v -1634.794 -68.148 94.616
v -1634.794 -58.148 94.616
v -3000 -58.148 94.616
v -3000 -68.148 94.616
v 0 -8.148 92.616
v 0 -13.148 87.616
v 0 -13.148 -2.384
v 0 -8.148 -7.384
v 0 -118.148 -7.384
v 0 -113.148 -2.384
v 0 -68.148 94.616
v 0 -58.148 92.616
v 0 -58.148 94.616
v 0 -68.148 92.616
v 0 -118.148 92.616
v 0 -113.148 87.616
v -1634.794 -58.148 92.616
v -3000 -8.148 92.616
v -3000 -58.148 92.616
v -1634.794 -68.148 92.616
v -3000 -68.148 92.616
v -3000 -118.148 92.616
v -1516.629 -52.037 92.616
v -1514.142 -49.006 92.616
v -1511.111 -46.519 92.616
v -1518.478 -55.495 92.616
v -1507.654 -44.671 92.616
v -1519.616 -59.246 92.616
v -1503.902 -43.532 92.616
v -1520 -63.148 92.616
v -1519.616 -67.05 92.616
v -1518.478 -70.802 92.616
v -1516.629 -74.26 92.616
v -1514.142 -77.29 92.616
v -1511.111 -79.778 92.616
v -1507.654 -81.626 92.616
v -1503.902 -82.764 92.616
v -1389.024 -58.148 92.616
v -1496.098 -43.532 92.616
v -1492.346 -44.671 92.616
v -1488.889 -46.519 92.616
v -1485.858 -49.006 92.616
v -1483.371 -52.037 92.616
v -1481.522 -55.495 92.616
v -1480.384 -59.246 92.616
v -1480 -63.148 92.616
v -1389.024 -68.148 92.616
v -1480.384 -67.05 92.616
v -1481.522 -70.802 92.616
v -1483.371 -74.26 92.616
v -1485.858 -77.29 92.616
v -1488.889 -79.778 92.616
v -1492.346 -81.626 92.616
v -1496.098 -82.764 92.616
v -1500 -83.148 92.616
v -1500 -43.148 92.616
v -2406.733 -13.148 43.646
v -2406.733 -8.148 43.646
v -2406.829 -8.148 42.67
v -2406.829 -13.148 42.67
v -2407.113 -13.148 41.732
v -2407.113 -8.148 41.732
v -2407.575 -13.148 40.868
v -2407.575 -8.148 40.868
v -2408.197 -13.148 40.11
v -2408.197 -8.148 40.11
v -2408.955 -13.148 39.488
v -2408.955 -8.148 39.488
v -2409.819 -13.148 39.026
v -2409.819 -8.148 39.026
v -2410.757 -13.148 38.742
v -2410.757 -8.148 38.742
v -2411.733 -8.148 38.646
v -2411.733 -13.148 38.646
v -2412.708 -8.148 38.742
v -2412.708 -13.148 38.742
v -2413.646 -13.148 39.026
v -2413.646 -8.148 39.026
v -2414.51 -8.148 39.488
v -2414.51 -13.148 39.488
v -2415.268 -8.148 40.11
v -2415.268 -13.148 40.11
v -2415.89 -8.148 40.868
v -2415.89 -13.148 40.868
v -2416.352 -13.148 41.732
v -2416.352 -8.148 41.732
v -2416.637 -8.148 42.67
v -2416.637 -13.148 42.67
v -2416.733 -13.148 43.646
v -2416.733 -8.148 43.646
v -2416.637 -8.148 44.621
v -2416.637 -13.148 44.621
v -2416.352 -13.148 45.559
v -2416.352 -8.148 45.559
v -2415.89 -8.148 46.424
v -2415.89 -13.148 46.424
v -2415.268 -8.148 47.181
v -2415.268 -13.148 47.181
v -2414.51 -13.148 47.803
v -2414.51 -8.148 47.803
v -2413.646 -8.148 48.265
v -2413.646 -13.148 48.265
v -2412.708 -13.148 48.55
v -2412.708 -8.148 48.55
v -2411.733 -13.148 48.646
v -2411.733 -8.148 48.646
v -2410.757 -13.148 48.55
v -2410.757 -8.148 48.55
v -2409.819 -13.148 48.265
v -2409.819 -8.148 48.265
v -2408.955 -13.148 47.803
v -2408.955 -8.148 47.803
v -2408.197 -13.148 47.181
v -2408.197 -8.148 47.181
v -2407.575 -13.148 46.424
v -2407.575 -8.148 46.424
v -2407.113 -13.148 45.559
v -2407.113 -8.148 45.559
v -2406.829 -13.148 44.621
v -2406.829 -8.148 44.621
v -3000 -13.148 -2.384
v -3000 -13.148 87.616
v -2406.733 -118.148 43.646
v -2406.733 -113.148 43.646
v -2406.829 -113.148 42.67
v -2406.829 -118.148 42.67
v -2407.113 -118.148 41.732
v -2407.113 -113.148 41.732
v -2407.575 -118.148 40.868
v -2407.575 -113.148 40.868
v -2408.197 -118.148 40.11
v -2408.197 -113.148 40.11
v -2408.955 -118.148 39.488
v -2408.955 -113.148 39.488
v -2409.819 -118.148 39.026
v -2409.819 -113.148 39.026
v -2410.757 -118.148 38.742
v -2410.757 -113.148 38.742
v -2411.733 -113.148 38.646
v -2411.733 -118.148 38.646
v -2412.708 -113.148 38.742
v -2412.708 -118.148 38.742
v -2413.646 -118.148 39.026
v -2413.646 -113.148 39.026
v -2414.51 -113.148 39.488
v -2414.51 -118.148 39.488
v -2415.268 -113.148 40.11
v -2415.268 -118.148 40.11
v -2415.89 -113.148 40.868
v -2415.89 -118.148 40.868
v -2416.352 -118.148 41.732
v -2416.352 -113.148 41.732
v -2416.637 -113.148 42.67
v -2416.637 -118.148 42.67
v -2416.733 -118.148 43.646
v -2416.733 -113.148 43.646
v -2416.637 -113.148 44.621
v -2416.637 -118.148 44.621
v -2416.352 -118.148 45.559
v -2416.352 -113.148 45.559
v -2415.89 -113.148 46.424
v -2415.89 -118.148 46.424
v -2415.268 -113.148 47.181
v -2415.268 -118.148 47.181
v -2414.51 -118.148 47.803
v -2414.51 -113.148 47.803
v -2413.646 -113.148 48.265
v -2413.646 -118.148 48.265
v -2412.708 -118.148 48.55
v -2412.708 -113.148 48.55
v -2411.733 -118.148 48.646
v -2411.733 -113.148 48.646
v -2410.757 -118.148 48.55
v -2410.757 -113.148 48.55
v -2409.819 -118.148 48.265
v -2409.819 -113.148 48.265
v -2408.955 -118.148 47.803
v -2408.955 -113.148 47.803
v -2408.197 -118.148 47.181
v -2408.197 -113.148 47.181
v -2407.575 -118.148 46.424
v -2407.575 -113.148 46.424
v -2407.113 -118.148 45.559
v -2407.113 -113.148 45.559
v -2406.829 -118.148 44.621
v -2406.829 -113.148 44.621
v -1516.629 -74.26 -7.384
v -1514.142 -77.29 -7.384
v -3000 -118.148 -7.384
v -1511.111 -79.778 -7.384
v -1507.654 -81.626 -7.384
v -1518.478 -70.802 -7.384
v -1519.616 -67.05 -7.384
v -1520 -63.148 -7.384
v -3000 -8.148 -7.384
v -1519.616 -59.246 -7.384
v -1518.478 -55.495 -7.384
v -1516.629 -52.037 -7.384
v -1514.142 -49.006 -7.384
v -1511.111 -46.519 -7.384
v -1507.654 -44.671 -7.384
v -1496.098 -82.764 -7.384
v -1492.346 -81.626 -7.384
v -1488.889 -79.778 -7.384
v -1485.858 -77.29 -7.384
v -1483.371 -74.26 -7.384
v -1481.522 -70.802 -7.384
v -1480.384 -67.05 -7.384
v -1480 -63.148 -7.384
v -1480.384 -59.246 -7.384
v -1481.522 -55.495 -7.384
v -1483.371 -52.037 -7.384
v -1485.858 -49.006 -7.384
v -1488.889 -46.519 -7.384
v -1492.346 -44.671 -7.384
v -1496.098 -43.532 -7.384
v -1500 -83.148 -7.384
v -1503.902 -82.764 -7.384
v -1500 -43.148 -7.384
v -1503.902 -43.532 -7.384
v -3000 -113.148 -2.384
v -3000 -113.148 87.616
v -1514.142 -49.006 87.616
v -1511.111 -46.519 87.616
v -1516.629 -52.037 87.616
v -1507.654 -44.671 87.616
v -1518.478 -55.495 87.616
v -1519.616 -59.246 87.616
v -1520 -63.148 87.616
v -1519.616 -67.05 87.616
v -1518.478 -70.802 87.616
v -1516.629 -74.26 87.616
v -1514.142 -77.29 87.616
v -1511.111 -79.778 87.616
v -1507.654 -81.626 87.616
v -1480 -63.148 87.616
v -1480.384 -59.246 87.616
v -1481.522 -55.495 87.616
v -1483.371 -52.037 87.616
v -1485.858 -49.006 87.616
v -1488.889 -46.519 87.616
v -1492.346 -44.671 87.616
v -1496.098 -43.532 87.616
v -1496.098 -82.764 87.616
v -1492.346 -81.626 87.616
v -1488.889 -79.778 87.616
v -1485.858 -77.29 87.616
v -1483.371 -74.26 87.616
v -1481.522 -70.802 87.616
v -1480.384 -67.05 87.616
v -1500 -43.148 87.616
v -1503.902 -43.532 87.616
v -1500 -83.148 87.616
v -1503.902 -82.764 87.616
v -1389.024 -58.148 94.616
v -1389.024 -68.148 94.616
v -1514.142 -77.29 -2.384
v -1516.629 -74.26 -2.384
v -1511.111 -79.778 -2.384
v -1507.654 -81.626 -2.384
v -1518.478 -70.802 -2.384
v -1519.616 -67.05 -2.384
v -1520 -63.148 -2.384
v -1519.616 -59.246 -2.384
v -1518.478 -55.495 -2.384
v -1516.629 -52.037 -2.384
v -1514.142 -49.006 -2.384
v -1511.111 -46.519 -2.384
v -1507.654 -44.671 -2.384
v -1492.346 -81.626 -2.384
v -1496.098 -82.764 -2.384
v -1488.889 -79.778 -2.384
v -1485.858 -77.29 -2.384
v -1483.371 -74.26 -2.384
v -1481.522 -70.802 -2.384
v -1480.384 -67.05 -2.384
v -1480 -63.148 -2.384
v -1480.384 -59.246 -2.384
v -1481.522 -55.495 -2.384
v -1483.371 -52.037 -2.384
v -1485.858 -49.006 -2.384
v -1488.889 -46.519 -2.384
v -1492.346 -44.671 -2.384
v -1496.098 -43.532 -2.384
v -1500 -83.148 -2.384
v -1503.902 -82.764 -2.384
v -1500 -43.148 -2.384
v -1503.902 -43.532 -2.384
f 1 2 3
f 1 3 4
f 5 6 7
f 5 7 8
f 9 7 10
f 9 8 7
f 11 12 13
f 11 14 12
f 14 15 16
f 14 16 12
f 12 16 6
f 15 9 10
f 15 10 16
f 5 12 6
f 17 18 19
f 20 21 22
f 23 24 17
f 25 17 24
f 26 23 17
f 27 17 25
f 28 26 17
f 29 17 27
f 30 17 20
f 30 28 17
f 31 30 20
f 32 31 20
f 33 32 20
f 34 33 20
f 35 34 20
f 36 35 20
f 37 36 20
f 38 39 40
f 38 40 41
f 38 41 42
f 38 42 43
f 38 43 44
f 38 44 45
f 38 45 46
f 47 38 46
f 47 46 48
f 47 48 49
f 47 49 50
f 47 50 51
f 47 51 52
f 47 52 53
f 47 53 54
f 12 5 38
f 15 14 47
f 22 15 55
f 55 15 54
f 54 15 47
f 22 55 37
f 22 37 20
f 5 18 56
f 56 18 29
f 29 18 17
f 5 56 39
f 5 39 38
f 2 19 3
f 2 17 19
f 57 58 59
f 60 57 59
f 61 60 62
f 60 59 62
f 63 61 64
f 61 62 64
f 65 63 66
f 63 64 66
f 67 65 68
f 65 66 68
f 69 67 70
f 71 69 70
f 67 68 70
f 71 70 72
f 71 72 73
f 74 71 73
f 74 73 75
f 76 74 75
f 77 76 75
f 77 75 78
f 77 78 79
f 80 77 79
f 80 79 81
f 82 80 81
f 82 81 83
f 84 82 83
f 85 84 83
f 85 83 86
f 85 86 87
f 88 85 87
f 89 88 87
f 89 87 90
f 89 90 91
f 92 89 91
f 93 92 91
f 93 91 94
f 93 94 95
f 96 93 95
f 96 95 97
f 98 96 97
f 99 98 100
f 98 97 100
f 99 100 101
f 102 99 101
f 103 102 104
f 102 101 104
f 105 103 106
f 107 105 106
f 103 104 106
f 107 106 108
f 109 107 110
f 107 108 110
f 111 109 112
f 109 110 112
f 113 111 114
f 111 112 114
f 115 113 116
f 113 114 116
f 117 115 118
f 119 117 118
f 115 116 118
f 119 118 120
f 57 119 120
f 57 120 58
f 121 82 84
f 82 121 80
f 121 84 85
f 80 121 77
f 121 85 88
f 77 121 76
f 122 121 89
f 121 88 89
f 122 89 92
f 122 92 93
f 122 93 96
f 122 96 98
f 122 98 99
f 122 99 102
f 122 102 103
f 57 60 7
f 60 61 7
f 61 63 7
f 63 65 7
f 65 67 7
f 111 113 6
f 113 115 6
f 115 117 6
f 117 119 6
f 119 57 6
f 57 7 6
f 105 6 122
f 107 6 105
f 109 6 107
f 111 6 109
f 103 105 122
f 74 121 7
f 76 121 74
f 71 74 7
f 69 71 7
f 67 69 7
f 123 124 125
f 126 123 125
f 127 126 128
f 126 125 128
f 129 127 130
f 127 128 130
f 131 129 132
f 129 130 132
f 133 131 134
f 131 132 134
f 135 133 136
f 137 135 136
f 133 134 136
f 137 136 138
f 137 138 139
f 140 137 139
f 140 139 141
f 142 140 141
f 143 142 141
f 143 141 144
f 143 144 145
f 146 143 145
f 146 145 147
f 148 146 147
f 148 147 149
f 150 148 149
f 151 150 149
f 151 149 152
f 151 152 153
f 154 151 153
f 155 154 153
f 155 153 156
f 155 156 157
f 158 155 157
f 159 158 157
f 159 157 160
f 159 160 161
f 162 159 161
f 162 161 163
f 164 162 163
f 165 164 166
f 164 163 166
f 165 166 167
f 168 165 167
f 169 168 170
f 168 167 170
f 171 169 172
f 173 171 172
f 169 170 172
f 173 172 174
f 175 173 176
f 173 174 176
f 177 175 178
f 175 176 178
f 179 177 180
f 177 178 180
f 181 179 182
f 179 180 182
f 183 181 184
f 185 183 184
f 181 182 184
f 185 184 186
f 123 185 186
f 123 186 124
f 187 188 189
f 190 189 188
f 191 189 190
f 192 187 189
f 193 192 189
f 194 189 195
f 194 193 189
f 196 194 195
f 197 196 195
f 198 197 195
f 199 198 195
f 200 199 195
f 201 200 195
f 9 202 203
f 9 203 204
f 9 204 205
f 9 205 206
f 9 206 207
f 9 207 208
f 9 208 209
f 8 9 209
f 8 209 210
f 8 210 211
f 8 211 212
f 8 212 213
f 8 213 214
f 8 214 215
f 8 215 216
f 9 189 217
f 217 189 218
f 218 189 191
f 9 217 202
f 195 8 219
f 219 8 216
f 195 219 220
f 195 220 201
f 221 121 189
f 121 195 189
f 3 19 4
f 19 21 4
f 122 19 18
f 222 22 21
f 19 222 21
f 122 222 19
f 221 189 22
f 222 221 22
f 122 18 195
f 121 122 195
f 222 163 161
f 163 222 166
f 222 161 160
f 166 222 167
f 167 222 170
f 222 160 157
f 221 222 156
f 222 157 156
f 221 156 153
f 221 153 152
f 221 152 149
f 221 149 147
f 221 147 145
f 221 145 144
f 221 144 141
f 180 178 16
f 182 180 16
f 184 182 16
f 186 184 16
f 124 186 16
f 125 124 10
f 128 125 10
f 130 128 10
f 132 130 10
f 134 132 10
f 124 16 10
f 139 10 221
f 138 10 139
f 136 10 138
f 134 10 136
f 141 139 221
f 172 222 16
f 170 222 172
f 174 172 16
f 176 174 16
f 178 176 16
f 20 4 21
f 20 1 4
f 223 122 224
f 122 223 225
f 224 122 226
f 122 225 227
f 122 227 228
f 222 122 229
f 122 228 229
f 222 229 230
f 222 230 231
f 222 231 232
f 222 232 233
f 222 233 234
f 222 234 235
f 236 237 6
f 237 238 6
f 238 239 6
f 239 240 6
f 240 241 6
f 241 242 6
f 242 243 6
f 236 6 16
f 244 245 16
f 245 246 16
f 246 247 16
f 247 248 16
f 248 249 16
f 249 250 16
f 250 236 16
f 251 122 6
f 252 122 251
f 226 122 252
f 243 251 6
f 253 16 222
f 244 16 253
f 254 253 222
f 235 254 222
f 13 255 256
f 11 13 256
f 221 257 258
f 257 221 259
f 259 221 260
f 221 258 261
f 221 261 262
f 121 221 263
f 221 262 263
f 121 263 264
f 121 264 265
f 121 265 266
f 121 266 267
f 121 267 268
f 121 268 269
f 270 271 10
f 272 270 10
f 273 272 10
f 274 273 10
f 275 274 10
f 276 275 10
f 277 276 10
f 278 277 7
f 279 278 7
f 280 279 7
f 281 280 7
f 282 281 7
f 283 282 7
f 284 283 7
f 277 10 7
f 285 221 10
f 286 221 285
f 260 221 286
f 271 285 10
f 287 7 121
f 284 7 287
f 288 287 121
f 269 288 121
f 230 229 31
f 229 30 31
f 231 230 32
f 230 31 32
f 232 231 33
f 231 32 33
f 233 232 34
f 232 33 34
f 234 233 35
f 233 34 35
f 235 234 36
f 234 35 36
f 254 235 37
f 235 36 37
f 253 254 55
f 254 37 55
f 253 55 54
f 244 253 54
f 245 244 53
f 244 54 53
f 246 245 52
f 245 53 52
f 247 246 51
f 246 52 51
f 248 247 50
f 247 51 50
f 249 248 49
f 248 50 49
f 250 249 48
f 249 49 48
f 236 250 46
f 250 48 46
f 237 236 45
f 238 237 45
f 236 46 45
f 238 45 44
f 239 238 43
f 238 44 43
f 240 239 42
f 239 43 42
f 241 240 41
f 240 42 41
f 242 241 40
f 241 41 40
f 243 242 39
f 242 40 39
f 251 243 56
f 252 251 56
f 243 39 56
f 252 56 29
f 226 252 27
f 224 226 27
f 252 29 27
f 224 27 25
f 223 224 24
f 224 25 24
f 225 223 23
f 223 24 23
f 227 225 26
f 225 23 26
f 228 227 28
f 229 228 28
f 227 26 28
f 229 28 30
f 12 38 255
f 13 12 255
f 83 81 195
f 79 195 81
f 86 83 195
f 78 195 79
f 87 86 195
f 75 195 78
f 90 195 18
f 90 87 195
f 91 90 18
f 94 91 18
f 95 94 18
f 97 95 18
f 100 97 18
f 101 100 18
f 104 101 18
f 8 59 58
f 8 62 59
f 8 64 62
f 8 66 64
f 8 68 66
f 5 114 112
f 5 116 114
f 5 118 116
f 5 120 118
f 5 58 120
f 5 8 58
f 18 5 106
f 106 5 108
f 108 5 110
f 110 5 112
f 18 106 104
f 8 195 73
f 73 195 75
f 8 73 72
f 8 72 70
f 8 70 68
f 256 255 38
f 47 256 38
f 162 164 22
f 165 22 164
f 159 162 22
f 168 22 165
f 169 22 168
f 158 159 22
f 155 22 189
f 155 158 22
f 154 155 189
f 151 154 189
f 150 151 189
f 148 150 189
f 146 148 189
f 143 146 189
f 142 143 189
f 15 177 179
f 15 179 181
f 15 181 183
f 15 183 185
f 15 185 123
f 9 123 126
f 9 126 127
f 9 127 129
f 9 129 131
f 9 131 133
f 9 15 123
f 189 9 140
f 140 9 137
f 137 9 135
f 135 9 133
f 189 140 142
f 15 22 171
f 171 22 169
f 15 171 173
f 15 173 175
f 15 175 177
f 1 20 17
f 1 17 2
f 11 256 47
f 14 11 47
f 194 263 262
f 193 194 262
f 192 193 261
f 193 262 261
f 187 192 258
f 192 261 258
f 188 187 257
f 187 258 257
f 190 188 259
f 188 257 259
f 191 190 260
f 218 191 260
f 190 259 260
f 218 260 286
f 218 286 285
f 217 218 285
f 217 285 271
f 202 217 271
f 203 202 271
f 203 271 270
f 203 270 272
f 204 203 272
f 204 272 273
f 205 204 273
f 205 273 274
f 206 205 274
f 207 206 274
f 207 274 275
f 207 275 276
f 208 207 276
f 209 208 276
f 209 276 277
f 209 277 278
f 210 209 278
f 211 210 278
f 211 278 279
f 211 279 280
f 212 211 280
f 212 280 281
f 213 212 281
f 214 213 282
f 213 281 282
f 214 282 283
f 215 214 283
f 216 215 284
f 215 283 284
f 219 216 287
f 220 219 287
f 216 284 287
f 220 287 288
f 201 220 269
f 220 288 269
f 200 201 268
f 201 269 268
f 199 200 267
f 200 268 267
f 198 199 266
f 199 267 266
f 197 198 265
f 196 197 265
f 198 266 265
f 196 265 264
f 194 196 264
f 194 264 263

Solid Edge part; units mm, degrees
sketch "Sketch1" plane through (0, 0, 0) normal (1, 0, 0) x (0, 1, 0)
  line L0 (-113.1482, -2.3837) -> (-13.1482, -2.3837)
  line L1 (-13.1482, -2.3837) -> (-13.1482, 87.6163)
  line L2 (-13.1482, 87.6163) -> (-113.1482, 87.6163)
  line L3 (-113.1482, 87.6163) -> (-113.1482, -2.3837)
  line L4 (-68.1482, 92.6163) -> (-58.1482, 92.6163)
  line L5 (-58.1482, 92.6163) -> (-58.1482, 94.6163)
  line L6 (-58.1482, 94.6163) -> (-68.1482, 94.6163)
  line L7 (-68.1482, 94.6163) -> (-68.1482, 92.6163)
  line L8 (-118.1482, -7.3837) -> (-8.1482, -7.3837)
  line L9 (-8.1482, -7.3837) -> (-8.1482, 92.6163)
  line L10 (-8.1482, 92.6163) -> (-118.1482, 92.6163)
  line L11 (-118.1482, 92.6163) -> (-118.1482, -7.3837)
  dimension "D1" = 100
  dimension "D2" = 110
  dimension "D3" = 100
  dimension "D4" = 90
  dimension "D5" = 10
  dimension "D6" = 2
extrude "Protrusion1" add sketch "Sketch1" against normal blind 3000
sketch "Sketch2" plane through (-1250, -71.3361, 94.6163) normal (0, 0, 1) x (-1, 0, 0)
  circle A0 centre (250, -8.1879) radius 20
  dimension "D1" = 40
extrude "Cutout1" cut sketch "Sketch2" against normal through all
sketch "Sketch3" plane through (-1250, -8.1482, 42.6163) normal (0, 1, 0) x (1, 0, 0)
  circle A0 centre (-1161.7326, -1.0294) radius 5
extrude "Cutout2" cut sketch "Sketch3" against normal through all
sketch "Sketch4" plane through (-1500, -8.1482, 42.6163) normal (0, 1, 0) x (-1, 0, 0)
  line L0 (-110.9759, 50) -> (134.794, 50)
  line L1 (134.794, 50) -> (134.794, 75.8919)
  line L2 (134.794, 75.8919) -> (-110.9759, 75.8919)
  line L3 (-110.9759, 75.8919) -> (-110.9759, 50)
extrude "Cutout3" cut sketch "Sketch4" against normal through all
